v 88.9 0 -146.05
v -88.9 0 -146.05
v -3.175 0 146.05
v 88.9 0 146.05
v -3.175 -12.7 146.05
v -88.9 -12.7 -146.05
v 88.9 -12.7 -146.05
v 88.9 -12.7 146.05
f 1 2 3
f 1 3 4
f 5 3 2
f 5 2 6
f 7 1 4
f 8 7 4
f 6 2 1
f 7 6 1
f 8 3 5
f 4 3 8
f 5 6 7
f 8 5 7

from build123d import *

# Parameters (mm, degrees)
F0_W     = 177.8
F0_H     = 292.1
F1_DEPTH = 12.7
F2_SIZE2 = 85.72499
F2_SIZE  = 292.09999


# Not quite as in the source:
# - a fillet or chamfer is up to 0.001 mm smaller than in the source, because OpenCascade refuses the exact size


with BuildPart() as f1:
    # F0 (on Front) → F1 (new body)
    with BuildSketch(Plane.XZ):
        Rectangle(F0_W, F0_H)
    extrude(amount=F1_DEPTH)

    # F2 (size 292.1 and 85.725 in the source; OpenCascade refuses exactly that, so slightly less here)
    f2_edges = [f1.edges().sort_by_distance(p)[0] for p in [
        (-88.9, -6.35, 146.05),
    ]]
    f2_side = f1.faces().sort_by_distance((-88.9, -6.35, 0))[0]
    chamfer(f2_edges, length=F2_SIZE, length2=F2_SIZE2, reference=f2_side)


solid = f1.part
